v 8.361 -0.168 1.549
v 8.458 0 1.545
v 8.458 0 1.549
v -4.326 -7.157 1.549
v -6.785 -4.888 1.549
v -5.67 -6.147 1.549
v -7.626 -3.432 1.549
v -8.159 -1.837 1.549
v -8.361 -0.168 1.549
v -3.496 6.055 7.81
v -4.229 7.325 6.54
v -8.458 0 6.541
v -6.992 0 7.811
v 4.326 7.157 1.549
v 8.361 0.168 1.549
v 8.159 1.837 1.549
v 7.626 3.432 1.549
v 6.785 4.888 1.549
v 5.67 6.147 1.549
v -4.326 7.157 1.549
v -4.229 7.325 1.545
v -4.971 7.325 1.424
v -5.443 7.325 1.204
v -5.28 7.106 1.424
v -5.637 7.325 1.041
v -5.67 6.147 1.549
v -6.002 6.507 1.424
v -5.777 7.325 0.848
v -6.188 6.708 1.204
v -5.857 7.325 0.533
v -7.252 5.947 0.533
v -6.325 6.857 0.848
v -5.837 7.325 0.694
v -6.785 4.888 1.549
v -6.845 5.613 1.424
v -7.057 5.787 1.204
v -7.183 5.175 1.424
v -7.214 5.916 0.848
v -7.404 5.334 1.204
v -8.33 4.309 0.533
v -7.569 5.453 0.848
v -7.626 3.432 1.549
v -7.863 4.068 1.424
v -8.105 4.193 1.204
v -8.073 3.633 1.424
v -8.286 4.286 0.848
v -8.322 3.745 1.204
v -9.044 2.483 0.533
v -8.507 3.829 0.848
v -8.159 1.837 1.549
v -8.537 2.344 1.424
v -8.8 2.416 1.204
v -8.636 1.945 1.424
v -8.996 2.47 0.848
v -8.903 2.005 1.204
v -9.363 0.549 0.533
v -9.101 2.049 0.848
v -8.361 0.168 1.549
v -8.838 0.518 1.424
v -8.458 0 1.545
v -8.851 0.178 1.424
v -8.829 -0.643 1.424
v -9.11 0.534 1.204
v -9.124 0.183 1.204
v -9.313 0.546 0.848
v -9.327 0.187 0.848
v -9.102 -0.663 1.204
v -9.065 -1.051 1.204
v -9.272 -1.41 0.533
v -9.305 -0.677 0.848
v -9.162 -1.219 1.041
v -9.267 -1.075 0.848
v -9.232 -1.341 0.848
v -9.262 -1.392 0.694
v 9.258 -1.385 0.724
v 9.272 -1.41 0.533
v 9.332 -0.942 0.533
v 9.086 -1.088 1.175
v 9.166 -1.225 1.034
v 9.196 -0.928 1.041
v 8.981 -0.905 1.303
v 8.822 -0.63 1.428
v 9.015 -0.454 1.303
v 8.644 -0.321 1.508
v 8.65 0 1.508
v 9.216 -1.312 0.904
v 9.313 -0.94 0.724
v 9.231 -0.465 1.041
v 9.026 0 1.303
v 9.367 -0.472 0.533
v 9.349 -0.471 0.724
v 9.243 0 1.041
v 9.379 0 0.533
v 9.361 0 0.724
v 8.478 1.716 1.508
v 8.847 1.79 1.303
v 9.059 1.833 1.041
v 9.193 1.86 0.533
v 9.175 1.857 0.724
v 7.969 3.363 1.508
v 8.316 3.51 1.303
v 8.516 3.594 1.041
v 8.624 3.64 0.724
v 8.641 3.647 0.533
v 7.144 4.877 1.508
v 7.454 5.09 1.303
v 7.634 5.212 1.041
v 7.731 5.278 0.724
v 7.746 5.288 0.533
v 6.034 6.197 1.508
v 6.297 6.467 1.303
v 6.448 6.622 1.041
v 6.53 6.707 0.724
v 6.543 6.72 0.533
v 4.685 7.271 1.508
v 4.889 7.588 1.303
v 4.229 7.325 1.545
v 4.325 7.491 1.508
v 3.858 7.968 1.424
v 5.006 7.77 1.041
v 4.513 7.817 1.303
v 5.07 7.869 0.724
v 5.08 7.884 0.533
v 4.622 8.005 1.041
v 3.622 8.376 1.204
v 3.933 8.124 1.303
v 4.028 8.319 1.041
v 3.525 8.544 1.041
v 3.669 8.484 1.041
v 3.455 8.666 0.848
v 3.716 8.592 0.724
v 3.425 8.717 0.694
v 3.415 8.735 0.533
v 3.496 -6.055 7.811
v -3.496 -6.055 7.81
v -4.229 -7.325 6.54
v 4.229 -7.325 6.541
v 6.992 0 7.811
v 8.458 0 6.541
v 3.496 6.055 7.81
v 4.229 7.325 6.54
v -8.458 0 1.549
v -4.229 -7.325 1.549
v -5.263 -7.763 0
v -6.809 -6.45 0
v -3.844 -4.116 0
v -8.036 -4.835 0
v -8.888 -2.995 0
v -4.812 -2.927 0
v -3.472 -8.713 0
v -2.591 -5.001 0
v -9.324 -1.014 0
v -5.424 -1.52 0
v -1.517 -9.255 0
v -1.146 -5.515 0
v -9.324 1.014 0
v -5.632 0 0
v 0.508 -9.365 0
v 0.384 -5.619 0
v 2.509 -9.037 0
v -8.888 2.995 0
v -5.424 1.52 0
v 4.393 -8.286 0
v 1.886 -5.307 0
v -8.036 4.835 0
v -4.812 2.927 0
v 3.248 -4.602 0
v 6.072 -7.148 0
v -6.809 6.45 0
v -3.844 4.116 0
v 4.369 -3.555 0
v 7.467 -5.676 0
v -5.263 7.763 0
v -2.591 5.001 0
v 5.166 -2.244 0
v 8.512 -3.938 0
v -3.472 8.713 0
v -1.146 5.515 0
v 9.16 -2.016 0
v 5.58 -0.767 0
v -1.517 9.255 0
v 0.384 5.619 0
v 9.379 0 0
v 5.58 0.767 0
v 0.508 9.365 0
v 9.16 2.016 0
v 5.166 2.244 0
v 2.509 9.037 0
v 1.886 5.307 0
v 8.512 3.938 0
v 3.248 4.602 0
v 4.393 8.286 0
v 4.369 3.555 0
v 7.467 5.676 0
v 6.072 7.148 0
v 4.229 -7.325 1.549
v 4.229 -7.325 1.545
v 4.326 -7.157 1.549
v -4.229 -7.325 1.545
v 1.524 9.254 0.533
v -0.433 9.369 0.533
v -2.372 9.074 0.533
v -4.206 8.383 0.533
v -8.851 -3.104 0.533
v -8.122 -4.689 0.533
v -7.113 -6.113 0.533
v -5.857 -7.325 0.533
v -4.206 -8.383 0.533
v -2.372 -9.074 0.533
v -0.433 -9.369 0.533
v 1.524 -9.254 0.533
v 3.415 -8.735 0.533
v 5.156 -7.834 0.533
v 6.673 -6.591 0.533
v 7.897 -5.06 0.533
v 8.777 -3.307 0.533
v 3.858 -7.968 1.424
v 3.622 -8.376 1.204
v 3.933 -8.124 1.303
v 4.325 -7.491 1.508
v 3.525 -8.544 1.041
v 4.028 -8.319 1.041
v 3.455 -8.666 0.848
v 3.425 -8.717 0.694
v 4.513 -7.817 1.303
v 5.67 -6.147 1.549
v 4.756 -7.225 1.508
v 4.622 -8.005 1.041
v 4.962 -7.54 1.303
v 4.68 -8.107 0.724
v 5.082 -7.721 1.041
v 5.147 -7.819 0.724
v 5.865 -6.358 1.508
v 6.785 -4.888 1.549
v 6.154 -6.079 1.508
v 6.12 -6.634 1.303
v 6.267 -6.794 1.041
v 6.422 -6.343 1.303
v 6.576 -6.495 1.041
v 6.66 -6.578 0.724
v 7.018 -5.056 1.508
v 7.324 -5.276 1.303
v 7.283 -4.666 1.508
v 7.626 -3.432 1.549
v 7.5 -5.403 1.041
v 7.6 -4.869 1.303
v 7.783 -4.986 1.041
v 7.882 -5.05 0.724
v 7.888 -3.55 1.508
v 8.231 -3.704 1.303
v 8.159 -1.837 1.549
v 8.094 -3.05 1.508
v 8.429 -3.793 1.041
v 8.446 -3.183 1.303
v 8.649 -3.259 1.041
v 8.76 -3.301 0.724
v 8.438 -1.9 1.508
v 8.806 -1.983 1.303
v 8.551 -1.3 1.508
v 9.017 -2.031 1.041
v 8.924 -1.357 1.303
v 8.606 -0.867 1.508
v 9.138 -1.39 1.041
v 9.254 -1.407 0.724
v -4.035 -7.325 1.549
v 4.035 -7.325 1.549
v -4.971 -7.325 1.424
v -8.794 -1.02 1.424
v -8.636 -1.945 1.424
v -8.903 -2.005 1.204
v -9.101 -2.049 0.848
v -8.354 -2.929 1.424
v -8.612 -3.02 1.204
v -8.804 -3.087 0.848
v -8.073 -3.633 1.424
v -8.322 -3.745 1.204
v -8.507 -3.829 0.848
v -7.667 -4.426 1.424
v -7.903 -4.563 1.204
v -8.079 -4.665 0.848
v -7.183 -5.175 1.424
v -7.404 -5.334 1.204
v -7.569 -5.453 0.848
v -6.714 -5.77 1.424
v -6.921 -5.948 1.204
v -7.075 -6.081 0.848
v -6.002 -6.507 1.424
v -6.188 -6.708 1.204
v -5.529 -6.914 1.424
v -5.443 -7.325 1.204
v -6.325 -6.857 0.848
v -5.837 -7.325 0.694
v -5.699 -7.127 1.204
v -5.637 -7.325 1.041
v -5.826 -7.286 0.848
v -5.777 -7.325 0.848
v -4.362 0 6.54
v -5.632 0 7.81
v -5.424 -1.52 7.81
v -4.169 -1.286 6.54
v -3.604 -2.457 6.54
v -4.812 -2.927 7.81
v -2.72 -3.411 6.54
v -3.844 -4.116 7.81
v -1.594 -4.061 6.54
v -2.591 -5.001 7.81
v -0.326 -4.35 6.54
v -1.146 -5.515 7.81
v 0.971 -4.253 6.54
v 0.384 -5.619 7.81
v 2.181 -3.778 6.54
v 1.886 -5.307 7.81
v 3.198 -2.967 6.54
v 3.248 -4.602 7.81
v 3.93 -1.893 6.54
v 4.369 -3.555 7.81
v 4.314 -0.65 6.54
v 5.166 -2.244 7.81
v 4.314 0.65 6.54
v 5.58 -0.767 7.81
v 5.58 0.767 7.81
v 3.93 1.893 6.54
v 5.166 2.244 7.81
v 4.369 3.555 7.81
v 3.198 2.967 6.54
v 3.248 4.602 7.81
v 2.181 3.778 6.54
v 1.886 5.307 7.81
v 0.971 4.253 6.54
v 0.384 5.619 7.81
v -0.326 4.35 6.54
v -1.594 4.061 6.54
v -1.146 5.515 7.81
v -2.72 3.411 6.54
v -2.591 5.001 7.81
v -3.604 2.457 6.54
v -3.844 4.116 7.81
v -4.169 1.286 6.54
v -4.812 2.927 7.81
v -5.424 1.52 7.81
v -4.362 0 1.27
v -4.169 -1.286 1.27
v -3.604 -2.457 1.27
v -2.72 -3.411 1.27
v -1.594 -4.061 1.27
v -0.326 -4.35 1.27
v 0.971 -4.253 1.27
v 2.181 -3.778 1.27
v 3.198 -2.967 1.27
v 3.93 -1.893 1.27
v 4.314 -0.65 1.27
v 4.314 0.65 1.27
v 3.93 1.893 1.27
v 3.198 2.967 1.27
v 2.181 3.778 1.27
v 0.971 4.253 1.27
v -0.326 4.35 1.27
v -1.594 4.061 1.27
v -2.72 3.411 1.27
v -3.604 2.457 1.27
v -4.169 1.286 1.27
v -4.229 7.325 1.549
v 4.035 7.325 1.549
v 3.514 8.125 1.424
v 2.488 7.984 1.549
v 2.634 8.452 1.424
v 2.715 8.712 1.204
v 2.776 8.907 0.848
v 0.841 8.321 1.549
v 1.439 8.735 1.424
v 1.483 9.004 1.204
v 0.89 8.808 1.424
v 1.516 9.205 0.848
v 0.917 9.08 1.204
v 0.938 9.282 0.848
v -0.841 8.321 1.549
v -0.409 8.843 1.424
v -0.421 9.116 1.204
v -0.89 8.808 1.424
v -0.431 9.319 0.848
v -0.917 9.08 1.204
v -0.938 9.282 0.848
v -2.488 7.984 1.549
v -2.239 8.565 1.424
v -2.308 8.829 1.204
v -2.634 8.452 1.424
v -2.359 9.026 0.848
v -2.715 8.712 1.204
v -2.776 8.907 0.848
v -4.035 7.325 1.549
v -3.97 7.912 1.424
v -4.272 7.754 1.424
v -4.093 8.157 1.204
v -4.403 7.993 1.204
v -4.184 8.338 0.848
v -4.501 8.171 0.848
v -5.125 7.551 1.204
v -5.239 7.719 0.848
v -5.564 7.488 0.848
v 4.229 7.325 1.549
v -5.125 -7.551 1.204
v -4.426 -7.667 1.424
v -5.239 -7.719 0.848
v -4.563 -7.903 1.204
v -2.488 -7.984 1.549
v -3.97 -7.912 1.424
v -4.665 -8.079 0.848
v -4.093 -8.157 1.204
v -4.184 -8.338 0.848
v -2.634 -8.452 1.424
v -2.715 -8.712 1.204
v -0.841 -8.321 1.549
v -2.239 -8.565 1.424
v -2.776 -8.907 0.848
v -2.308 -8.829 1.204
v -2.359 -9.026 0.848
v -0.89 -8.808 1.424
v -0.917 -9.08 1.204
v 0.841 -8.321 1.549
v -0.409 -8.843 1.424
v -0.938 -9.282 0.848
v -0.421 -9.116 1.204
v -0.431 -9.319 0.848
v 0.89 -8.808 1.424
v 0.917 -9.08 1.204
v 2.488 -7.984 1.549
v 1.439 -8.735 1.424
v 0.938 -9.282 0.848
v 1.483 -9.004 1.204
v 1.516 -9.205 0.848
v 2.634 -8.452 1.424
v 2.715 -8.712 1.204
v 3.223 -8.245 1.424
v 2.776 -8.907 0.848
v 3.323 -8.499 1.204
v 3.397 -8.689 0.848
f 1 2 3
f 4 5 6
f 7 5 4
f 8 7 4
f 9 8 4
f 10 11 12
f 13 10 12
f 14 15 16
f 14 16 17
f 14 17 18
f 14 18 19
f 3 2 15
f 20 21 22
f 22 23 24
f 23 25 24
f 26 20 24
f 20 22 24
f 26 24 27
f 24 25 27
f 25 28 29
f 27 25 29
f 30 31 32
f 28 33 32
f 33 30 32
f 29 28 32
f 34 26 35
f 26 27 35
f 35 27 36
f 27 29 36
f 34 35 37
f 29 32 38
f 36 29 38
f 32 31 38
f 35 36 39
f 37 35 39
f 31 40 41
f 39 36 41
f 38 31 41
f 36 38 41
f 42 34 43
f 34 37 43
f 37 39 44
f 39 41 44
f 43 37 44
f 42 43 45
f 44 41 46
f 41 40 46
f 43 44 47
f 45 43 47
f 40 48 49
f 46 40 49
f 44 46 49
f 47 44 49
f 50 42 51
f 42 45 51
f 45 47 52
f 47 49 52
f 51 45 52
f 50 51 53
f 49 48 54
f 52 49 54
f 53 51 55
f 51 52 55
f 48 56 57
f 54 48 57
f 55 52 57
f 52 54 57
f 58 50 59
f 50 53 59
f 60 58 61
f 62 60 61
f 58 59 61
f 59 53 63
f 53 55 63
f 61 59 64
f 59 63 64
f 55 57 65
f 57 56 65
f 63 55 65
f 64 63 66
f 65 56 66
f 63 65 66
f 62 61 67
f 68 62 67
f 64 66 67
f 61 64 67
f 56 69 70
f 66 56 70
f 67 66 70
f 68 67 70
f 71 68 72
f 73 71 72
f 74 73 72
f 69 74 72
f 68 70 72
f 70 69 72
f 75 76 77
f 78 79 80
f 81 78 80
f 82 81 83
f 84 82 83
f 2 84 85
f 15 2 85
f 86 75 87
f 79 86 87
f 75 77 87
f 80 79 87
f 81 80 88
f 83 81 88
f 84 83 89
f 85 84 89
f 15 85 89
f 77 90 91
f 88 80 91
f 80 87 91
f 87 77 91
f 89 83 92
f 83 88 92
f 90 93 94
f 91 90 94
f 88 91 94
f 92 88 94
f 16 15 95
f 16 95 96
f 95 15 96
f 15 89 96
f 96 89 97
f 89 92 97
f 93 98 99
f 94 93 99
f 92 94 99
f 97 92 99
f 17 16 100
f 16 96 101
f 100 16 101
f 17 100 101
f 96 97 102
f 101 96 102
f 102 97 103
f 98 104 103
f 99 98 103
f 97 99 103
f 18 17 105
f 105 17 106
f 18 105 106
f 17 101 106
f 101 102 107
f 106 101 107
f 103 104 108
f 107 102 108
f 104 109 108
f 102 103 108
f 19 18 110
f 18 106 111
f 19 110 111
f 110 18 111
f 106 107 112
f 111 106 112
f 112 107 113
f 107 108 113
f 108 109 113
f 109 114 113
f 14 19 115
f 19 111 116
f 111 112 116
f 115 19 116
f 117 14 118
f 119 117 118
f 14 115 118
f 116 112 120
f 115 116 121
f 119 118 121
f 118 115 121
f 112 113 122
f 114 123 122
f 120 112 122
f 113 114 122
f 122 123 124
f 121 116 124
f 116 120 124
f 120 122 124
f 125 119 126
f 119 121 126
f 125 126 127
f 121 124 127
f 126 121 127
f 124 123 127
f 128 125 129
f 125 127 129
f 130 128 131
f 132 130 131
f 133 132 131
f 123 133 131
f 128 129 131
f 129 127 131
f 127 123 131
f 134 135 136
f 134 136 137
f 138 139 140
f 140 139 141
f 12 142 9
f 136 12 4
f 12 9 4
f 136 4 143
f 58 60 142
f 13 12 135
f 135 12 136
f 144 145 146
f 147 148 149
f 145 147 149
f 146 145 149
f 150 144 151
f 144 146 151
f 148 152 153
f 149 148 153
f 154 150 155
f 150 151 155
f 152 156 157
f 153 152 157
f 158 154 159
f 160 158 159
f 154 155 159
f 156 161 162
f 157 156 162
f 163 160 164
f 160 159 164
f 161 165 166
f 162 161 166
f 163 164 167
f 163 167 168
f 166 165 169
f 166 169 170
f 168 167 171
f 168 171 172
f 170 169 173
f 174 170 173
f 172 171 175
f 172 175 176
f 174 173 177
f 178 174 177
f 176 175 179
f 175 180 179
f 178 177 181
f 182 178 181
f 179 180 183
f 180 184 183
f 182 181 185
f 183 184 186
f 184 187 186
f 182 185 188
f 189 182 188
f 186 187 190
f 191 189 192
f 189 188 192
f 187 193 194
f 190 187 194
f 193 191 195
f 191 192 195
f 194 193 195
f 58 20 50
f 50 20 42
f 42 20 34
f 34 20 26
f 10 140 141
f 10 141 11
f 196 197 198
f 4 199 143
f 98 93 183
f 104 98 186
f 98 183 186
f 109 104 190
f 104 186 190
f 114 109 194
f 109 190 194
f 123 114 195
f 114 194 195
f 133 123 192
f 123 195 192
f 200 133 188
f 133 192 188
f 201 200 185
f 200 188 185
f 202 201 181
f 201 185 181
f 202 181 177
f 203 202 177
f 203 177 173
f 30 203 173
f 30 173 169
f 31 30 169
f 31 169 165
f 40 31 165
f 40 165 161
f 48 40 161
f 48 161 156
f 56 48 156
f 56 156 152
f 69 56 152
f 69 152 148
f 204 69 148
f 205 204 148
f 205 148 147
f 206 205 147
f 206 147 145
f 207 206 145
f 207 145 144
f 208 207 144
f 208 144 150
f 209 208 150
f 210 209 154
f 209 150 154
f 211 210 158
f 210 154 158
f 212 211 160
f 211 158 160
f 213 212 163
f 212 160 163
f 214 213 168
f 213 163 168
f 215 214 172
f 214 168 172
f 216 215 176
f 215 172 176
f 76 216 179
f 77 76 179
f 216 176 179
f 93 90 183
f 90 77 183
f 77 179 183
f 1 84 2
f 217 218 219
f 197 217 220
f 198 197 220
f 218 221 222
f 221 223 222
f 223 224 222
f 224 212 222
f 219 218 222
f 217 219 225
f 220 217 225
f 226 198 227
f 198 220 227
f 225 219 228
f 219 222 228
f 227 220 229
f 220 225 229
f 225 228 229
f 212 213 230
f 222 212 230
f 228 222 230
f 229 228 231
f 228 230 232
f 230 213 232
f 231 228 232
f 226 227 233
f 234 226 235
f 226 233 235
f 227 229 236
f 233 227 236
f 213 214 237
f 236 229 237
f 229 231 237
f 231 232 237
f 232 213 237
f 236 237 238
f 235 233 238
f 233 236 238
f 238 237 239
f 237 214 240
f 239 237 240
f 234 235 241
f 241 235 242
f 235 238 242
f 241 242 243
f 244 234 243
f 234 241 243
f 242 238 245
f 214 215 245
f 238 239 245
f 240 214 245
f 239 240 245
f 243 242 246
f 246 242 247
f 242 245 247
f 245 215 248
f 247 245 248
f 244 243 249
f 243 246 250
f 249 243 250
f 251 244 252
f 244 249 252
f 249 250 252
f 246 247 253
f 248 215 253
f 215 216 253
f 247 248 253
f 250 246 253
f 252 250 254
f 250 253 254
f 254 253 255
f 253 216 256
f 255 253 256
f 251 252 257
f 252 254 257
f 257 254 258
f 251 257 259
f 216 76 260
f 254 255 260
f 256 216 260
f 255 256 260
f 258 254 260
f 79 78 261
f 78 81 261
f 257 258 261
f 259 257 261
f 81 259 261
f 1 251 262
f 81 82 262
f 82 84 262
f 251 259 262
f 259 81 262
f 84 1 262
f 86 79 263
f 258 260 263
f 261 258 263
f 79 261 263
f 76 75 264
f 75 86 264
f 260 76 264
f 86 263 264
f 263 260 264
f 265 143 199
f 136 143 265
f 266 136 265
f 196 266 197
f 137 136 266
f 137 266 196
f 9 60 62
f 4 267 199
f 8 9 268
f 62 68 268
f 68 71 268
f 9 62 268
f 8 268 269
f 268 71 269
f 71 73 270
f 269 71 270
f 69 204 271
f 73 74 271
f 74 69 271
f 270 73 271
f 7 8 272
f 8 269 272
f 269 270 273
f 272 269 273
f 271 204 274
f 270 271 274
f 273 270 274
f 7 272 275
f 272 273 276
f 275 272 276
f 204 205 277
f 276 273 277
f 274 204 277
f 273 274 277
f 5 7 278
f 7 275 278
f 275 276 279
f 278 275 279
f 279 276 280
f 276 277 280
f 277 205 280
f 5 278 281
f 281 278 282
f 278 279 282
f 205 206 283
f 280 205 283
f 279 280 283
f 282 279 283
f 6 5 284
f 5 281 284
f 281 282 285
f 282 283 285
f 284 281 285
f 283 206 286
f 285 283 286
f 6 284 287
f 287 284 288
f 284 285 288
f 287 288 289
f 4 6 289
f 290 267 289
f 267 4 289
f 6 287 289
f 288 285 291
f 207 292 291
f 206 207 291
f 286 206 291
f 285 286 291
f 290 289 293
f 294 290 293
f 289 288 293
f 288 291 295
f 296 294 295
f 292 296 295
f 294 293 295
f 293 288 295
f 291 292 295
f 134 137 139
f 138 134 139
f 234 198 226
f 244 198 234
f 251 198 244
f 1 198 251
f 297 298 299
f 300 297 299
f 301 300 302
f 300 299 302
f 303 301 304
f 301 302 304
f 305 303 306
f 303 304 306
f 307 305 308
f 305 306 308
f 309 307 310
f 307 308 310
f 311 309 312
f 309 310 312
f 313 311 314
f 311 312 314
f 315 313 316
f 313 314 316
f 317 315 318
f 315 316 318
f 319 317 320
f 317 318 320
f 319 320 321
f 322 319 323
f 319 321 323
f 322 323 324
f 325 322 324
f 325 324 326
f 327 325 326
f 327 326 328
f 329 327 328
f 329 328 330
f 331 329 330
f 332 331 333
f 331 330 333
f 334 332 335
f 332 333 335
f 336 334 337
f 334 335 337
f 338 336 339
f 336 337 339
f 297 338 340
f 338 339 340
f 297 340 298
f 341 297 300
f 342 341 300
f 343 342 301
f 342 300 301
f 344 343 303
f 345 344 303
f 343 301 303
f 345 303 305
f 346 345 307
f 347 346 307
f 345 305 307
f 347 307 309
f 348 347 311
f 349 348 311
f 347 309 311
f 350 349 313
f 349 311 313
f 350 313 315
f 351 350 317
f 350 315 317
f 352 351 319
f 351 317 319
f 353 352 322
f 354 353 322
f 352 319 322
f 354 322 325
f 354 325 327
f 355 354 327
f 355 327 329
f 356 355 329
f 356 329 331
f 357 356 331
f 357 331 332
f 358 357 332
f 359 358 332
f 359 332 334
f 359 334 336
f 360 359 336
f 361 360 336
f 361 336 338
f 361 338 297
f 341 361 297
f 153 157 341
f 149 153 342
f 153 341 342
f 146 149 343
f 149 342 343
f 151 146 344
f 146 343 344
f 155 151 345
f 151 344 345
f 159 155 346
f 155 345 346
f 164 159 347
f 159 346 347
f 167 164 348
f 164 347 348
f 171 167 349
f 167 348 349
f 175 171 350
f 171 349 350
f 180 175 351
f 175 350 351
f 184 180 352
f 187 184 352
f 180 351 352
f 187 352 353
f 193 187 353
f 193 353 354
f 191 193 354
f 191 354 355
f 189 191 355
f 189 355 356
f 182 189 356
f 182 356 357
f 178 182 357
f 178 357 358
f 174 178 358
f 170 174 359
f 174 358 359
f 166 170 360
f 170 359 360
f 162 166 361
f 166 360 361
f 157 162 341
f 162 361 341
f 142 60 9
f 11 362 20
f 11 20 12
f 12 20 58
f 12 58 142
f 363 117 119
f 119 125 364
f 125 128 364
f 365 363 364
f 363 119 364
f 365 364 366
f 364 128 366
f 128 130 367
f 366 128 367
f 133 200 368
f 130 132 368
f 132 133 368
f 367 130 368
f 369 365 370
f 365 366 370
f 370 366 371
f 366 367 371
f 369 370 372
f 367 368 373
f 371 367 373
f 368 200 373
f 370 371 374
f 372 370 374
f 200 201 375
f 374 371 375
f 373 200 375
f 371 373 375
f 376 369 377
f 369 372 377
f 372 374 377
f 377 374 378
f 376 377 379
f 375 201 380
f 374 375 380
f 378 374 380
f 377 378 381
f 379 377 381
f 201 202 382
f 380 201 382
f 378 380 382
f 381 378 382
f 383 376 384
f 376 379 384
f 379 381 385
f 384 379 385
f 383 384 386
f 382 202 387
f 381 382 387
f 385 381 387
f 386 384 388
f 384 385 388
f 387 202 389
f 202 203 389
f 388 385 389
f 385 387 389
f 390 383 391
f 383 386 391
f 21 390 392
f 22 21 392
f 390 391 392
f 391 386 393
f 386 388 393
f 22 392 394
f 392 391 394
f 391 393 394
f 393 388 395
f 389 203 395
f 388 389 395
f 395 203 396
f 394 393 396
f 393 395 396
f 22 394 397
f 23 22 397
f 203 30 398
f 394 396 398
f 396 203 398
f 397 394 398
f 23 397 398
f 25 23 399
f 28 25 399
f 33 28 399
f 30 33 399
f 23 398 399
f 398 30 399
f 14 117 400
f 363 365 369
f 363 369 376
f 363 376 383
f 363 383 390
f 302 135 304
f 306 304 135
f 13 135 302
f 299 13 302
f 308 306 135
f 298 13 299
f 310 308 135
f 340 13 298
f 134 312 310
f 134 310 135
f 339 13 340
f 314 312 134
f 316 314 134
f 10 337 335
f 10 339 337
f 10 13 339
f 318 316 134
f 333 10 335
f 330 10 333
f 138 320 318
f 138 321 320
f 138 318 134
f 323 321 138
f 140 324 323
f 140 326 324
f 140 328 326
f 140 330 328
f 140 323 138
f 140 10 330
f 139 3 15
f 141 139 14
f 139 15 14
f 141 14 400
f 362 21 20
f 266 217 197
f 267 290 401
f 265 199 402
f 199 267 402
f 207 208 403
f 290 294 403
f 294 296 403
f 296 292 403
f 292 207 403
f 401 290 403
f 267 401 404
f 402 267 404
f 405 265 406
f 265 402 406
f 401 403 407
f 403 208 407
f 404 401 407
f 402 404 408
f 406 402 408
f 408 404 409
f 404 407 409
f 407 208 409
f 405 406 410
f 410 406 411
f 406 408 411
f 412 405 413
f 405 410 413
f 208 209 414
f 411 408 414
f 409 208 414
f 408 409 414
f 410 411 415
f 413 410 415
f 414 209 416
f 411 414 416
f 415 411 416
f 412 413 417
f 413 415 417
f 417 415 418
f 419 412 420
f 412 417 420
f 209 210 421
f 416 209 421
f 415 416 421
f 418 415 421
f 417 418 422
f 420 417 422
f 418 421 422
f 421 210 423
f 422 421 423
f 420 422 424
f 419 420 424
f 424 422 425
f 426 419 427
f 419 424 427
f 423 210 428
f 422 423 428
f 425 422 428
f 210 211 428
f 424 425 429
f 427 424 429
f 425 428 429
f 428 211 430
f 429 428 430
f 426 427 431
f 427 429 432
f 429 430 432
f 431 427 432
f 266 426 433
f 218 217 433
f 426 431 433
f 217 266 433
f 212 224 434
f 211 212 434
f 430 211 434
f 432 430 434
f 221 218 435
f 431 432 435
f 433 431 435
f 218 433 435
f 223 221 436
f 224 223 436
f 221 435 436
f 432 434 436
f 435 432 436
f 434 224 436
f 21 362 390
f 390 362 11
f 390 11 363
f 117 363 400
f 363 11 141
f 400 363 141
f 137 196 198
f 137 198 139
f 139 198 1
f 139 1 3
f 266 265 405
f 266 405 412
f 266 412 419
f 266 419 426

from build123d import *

# Parameters (mm, degrees)
F1_DEPTH = 7.8105
F0_R     = 9.37895
F2_DEPTH = 1.5494
F4_D     = 8.7249
F5_SIZE  = 1.27


# Not quite as in the source:
# - a fillet or chamfer that OpenCascade refuses, or shapes differently, is made with other operations: its cross-section is extruded or revolved along the edge and cut away or added


with BuildPart() as f1:
    # F0 (on Top) → F1 (new body)
    with BuildSketch(Plane.XY):
        Polygon((4.2291, 7.3250160703), (-4.2291, 7.3250160703), (-8.4582, 0), (-4.2291, -7.3250160703), (4.2291, -7.3250160703), (8.4582, 0), align=None)
    extrude(amount=F1_DEPTH)

    # F0 (on Top) → F2 (join)
    with BuildSketch(Plane.XY):
        Circle(F0_R)
        Polygon((-8.4582, 0), (-4.2291, 7.3250160703), (4.2291, 7.3250160703), (8.4582, 0), (4.2291, -7.3250160703), (-4.2291, -7.3250160703), align=None, mode=Mode.SUBTRACT)
    extrude(amount=F2_DEPTH)

    # F3: fillet of radius 1.016 on 1 edges, made by hand


with BuildPart() as f3_tool2:
    # F3_s3 → F3_t4 (revolve)
    with BuildSketch(Plane.XZ):
        with BuildLine():
            ThreePointArc((8.36295, 1.5494), (9.0813704897, 1.2518204897), (9.37895, 0.5334))
            Line((9.37895, 0.5334), (9.37895, 1.5494))
            Line((9.37895, 1.5494), (8.36295, 1.5494))
        make_face()
    revolve(axis=Axis((0, 0, 1.5494), (0, 0, 1)))

    split(bisect_by=Plane(origin=(6.34365, 3.6625080351, 0), x_dir=(0, 0, 1), z_dir=(0.8660254038, 0.5, 0)), keep=Keep.TOP)


with BuildPart() as f1_1:
    add(f1.part)

    # F3_t1: cut F3_tool2
    add(f3_tool2.part, mode=Mode.SUBTRACT)


with BuildPart() as f3_tool7:
    # F3_s8 → F3_t9 (revolve)
    with BuildSketch(Plane.XZ):
        with BuildLine():
            ThreePointArc((8.36295, 1.5494), (9.0813704897, 1.2518204897), (9.37895, 0.5334))
            Line((9.37895, 0.5334), (9.37895, 1.5494))
            Line((9.37895, 1.5494), (8.36295, 1.5494))
        make_face()
    revolve(axis=Axis((0, 0, 1.5494), (0, 0, 1)))

    split(bisect_by=Plane(origin=(6.34365, -3.6625080351, 0), x_dir=(0, 0, 1), z_dir=(0.8660254038, -0.5, 0)), keep=Keep.TOP)


with BuildPart() as f1_2:
    add(f1_1.part)

    # F3_t6: cut F3_tool7
    add(f3_tool7.part, mode=Mode.SUBTRACT)


with BuildPart() as f3_tool12:
    # F3_s13 → F3_t14 (revolve)
    with BuildSketch(Plane.XZ):
        with BuildLine():
            ThreePointArc((8.36295, 1.5494), (9.0813704897, 1.2518204897), (9.37895, 0.5334))
            Line((9.37895, 0.5334), (9.37895, 1.5494))
            Line((9.37895, 1.5494), (8.36295, 1.5494))
        make_face()
    revolve(axis=Axis((0, 0, 1.5494), (0, 0, 1)))

    split(bisect_by=Plane.XZ.offset(-7.3250160703), keep=Keep.BOTTOM)


with BuildPart() as f1_3:
    add(f1_2.part)

    # F3_t11: cut F3_tool12
    add(f3_tool12.part, mode=Mode.SUBTRACT)


with BuildPart() as f3_tool17:
    # F3_s18 → F3_t19 (revolve)
    with BuildSketch(Plane.XZ):
        with BuildLine():
            ThreePointArc((8.36295, 1.5494), (9.0813704897, 1.2518204897), (9.37895, 0.5334))
            Line((9.37895, 0.5334), (9.37895, 1.5494))
            Line((9.37895, 1.5494), (8.36295, 1.5494))
        make_face()
    revolve(axis=Axis((0, 0, 1.5494), (0, 0, 1)))

    split(bisect_by=Plane.XZ.offset(7.3250160703), keep=Keep.TOP)


with BuildPart() as f1_4:
    add(f1_3.part)

    # F3_t16: cut F3_tool17
    add(f3_tool17.part, mode=Mode.SUBTRACT)


with BuildPart() as f3_tool22:
    # F3_s23 → F3_t24 (revolve)
    with BuildSketch(Plane.XZ):
        with BuildLine():
            ThreePointArc((8.36295, 1.5494), (9.0813704897, 1.2518204897), (9.37895, 0.5334))
            Line((9.37895, 0.5334), (9.37895, 1.5494))
            Line((9.37895, 1.5494), (8.36295, 1.5494))
        make_face()
    revolve(axis=Axis((0, 0, 1.5494), (0, 0, 1)))

    split(bisect_by=Plane(origin=(-6.34365, 3.6625080351, 0), x_dir=(0, 0, 1), z_dir=(-0.8660254038, 0.5, 0)), keep=Keep.TOP)


with BuildPart() as f1_5:
    add(f1_4.part)

    # F3_t21: cut F3_tool22
    add(f3_tool22.part, mode=Mode.SUBTRACT)


with BuildPart() as f3_tool27:
    # F3_s28 → F3_t29 (revolve)
    with BuildSketch(Plane.XZ):
        with BuildLine():
            ThreePointArc((8.36295, 1.5494), (9.0813704897, 1.2518204897), (9.37895, 0.5334))
            Line((9.37895, 0.5334), (9.37895, 1.5494))
            Line((9.37895, 1.5494), (8.36295, 1.5494))
        make_face()
    revolve(axis=Axis((0, 0, 1.5494), (0, 0, 1)))

    split(bisect_by=Plane(origin=(-6.34365, -3.6625080351, 0), x_dir=(0, 0, 1), z_dir=(-0.8660254038, -0.5, 0)), keep=Keep.TOP)


with BuildPart() as f1_6:
    add(f1_5.part)

    # F3_t26: cut F3_tool27
    add(f3_tool27.part, mode=Mode.SUBTRACT)

    # F4 (through all)
    with Locations(Plane(origin=(0, 0, 0), x_dir=(1, 0, 0), z_dir=(0, 0, -1))):
        with Locations((0, 0)):
            Hole(F4_D / 2)

    # F5
    f5_edges = [f1_6.edges().sort_by_distance(p)[0] for p in [
        (0, 7.325016, 7.8105),
        (6.34365, 3.662508, 7.8105),
        (6.34365, -3.662508, 7.8105),
        (0, -7.325016, 7.8105),
        (-6.34365, -3.662508, 7.8105),
        (-6.34365, 3.662508, 7.8105),
        (-4.36245, 0, 7.8105),
        (-4.36245, 0, 0),
    ]]
    chamfer(f5_edges, length=F5_SIZE)


solid = f1_6.part
